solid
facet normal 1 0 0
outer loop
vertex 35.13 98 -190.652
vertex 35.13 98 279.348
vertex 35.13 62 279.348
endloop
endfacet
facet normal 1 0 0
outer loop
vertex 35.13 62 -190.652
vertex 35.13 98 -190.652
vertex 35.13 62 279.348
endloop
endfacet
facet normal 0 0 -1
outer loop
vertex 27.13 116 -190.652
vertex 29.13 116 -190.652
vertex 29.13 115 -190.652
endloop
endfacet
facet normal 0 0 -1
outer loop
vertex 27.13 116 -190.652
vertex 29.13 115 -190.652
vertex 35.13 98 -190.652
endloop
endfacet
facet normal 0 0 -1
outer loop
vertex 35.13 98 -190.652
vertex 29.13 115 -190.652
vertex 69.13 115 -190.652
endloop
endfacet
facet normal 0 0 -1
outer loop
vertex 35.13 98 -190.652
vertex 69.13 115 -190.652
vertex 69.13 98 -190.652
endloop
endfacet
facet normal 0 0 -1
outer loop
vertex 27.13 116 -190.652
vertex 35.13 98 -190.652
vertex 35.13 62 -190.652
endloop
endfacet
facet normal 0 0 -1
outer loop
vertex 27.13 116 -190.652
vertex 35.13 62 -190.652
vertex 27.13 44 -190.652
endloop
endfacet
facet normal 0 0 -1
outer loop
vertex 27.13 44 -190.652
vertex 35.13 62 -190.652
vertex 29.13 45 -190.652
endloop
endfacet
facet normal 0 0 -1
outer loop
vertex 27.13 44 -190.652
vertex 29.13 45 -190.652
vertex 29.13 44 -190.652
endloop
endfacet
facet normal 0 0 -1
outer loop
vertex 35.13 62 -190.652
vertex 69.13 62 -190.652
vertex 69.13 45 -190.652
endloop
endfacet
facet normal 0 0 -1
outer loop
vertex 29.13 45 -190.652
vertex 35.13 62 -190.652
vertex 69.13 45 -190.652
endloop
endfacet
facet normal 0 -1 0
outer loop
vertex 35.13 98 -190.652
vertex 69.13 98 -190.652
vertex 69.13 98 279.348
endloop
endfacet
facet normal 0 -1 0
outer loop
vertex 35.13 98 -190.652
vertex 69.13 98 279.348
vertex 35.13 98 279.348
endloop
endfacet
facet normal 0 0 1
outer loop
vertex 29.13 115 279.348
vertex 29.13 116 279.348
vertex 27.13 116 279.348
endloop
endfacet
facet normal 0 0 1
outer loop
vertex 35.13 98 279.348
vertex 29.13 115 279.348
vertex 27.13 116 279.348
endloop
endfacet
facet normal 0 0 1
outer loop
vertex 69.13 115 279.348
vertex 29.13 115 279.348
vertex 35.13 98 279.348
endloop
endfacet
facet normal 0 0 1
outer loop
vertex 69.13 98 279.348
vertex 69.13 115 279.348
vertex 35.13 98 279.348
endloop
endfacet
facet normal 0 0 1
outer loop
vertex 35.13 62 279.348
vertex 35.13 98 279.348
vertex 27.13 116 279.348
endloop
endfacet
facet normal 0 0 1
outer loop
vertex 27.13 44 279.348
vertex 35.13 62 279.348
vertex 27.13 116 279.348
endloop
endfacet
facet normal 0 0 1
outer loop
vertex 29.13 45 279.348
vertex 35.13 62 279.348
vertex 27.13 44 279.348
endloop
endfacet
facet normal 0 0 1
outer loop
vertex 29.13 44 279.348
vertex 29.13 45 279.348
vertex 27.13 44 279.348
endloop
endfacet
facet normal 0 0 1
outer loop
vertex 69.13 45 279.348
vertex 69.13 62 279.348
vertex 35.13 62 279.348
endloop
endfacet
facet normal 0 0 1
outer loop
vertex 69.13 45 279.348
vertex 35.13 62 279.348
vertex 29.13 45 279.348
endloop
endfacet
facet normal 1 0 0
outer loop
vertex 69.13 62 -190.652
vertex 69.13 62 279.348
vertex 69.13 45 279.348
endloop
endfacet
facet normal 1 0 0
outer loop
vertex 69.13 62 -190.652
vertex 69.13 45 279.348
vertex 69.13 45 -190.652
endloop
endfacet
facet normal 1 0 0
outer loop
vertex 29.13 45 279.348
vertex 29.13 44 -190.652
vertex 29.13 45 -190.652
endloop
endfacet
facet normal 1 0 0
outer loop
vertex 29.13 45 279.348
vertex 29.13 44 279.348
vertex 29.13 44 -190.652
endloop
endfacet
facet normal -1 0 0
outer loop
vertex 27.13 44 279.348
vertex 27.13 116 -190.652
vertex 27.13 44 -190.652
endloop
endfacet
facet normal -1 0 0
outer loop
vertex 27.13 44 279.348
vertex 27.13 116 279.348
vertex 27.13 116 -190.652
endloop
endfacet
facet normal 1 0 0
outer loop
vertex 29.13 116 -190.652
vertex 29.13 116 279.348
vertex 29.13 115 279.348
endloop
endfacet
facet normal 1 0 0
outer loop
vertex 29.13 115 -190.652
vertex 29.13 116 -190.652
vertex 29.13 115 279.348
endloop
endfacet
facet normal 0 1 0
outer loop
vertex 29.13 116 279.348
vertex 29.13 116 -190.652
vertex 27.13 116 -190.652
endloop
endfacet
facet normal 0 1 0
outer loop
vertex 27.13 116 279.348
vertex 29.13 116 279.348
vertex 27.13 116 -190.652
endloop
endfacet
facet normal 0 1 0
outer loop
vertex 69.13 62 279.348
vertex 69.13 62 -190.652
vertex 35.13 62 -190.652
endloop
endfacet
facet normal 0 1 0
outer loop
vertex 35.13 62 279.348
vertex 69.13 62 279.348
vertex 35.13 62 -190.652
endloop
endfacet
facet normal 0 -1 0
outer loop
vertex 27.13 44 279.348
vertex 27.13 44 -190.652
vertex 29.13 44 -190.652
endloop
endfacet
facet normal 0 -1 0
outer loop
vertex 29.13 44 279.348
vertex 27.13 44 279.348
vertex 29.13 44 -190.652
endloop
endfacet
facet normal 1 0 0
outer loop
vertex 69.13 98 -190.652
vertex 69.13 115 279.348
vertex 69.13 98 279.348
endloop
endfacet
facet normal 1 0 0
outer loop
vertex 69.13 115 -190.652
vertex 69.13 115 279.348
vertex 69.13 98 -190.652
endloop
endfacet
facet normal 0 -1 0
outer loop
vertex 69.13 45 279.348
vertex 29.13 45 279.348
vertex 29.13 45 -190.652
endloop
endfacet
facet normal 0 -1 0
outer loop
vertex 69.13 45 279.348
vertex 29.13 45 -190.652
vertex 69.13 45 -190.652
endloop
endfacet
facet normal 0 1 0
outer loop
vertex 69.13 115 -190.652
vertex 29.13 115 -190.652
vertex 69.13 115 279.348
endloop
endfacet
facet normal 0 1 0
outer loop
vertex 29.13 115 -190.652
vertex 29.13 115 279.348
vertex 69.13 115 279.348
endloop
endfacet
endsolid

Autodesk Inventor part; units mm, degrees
ref_plane "YZ Plane" through (0, 0, 0) normal (1, 0, 0) x (0, 1, 0)
ref_plane "XZ Plane" through (0, 0, 0) normal (0, 1, 0) x (-1, 0, 0)
ref_plane "XY Plane" through (0, 0, 0) normal (0, 0, 1) x (1, 0, 0)
sketch "Sketch1" plane through (0, 0, 0) normal (0, 1, 0) x (-1, 0, 0)
  line L0 (0, 279.3478) -> (-39.1304, 279.3478)
  line L1 (-39.1304, 279.3478) -> (-39.1304, -195.6522)
  line L2 (-39.1304, -195.6522) -> (0, -195.6522)
  line L3 (0, -195.6522) -> (0, 279.3478)
  line L4 (-39.1304, 279.3478) -> (-29.1304, 279.3478)
  line L5 (-29.1304, 254.3478) -> (-39.1304, 254.3478)
  line L6 (-39.1304, 254.3478) -> (-39.1304, 279.3478)
  line L7 (-39.1304, -195.6522) -> (-29.1304, -195.6522)
  line L8 (-29.1304, -170.6522) -> (-39.1304, -170.6522)
  line L9 (-39.1304, -170.6522) -> (-39.1304, -195.6522)
  point P0 (0, 0)
  point P1 (-39.1304, 254.3478)
  dimension "d0" = 475
  dimension "d4" = 25
  dimension "d5" = 25
extrude "Extrusion1" add sketch "Sketch1" along normal blind 160
sketch "Sketch2" plane through (0, 0, 279.3478) normal (0, 0, 1) x (1, 0, 0)
  line L0 (0, 160) -> (39.1304, 160) projected
  line L1 (0, 160) -> (39.1304, 160)
  line L2 (39.1304, 160) -> (39.1304, 0)
  line L3 (39.1304, 0) -> (0, 0)
  line L4 (0, 0) -> (0, 160)
  line L5 (39.1304, 160) -> (29.1304, 160)
  line L6 (29.1304, 160) -> (29.1304, 115)
  line L7 (29.1304, 115) -> (39.1304, 115)
  line L8 (39.1304, 115) -> (39.1304, 160)
  line L9 (39.1304, 0) -> (29.1304, 0)
  line L10 (29.1304, 0) -> (29.1304, 45)
  line L11 (29.1304, 45) -> (39.1304, 45)
  line L12 (39.1304, 45) -> (39.1304, 0)
  circle A0 centre (39.1304, 80) radius 18
  line L13 (35.1304, 75) -> (39.1304, 75)
  line L14 (39.1304, 75) -> (39.1304, 98)
  line L15 (39.1304, 98) -> (35.1304, 98)
  line L16 (35.1304, 98) -> (35.1304, 75)
  line L17 (35.1304, 75) -> (39.1304, 75)
  line L18 (39.1304, 75) -> (39.1304, 62)
  line L19 (39.1304, 62) -> (35.1304, 62)
  line L20 (35.1304, 62) -> (35.1304, 75)
  line L21 (39.1304, 0) -> (39.1304, 160) projected
  line L22 (0, 160) -> (19.1304, 160)
  line L23 (19.1304, 160) -> (19.1304, 0)
  line L24 (19.1304, 0) -> (0, 0)
  line L25 (0, 0) -> (0, 160)
  point P0 (0, 0)
  point P1 (34.1304, 115)
  point P2 (34.1304, 160)
  point P3 (39.1304, 45)
  point P4 (39.1304, 115)
  dimension "d6" = 10
  dimension "d7" = 45
  dimension "d8" = 45
  dimension "d9" = 4
  dimension "d10" = 36
  dimension "d11" = 80
  dimension "d12" = 80
  dimension "d15" = 20
extrude "Extrusion2" cut sketch "Sketch2" against normal up to surface (475 mm away) contours L0 L23 L3 L4 | L0 L2 L7 L6 | L10 L11 L2 L3 | L2 L13 L16 A0 | A0 L16 L15 | L2 A0 L20 L13 | L19 L20 A0
sketch "Sketch3" plane through (0, 160, 0) normal (0, 1, 0) x (1, 0, 0)
  line L0 (-18, 349) -> (160, 349)
  line L1 (160, 349) -> (160, 190.6522)
  line L2 (160, 190.6522) -> (-18, 190.6522)
  line L3 (-18, 190.6522) -> (-18, 349)
  line L4 (19.1304, -279.3478) -> (29.1304, -279.3478) projected
  point P0 (0, 0)
  dimension "d16" = 470
extrude "Extrusion3" cut sketch "Sketch3" against normal blind 200
sketch "Sketch4" plane through (39.1304, 98, 279.3478) normal (1, 0, 0) x (0, 0, -1)
  line L0 (470, 0) -> (470, 17) projected
  line L1 (470, 17) -> (0, 17) projected
  line L2 (0, 0) -> (0, 17) projected
  line L3 (0, 0) -> (470, 0) projected
  line L4 (470, -53) -> (470, -36) projected
  line L5 (470, -36) -> (0, -36) projected
  line L6 (0, -53) -> (0, -36) projected
  line L7 (0, -53) -> (470, -53) projected
  point P0 (279.3478, -98)
extrude "Extrusion4" add sketch "Sketch4" along normal blind 30
sketch "Sketch5" plane through (19.1304, 0, 279.3478) normal (-1, 0, 0) x (0, 0, 1)
  line L0 (-470, 160) -> (-470, 0) projected
  line L1 (0, 0) -> (-470, 0) projected
  line L2 (0, 160) -> (0, 0) projected
  line L3 (-470, 160) -> (0, 160) projected
  point P0 (-279.3478, 0)
extrude "Extrusion5" add sketch "Sketch5" along normal blind 5
sketch "Sketch6" plane through (29.1304, 115, 279.3478) normal (0, 0, 1) x (1, 0, 0)
  line L0 (9, 13) -> (-3, 13)
  line L1 (-3, 13) -> (-3, 45)
  line L2 (-3, 45) -> (9, 45)
  line L3 (9, 45) -> (9, 13)
  line L4 (-15, -115) -> (0, -115) projected
  line L5 (11, -83) -> (-3, -83)
  line L6 (-3, -83) -> (-3, -115)
  line L7 (-3, -115) -> (11, -115)
  line L8 (11, -115) -> (11, -83)
  line L9 (0, -70) -> (40, -70) projected
  line L10 (0, 0) -> (40, 0) projected
  line L11 (0, 0) -> (0, 45) projected
  point P0 (-29.1304, -115)
  point P1 (0, -115)
  dimension "d23" = 13
  dimension "d24" = 13
  dimension "d25" = 3
extrude "Extrusion6" cut sketch "Sketch6" against normal blind 500
sketch "Sketch7" plane through (35.1304, 62, 279.3478) normal (0, 0, 1) x (1, 0, 0)
  line L0 (55, 54) -> (-8, 54)
  line L1 (-8, 54) -> (-8, -18)
  line L2 (-8, -18) -> (55, -18)
  line L3 (55, -18) -> (55, 54)
  line L4 (-6, 53) -> (34, 53) projected
  line L5 (-6, -17) -> (34, -17) projected
  line L6 (-6, -30) -> (-6, -17) projected
  line L7 (-9, 98) -> (-21, 98) projected
  line L8 (-21, 98) -> (63, 98)
  line L9 (63, 98) -> (63, -62)
  line L10 (63, -62) -> (-21, -62)
  line L11 (-21, -62) -> (-21, 98)
  point P0 (-35.1304, -62)
  point P1 (-9, 98)
  dimension "d28" = 1
  dimension "d29" = 1
  dimension "d30" = 2
extrude "Extrusion7" cut sketch "Sketch7" against normal blind 1000
properties part number "MainRails" material "Aluminum 6061"
